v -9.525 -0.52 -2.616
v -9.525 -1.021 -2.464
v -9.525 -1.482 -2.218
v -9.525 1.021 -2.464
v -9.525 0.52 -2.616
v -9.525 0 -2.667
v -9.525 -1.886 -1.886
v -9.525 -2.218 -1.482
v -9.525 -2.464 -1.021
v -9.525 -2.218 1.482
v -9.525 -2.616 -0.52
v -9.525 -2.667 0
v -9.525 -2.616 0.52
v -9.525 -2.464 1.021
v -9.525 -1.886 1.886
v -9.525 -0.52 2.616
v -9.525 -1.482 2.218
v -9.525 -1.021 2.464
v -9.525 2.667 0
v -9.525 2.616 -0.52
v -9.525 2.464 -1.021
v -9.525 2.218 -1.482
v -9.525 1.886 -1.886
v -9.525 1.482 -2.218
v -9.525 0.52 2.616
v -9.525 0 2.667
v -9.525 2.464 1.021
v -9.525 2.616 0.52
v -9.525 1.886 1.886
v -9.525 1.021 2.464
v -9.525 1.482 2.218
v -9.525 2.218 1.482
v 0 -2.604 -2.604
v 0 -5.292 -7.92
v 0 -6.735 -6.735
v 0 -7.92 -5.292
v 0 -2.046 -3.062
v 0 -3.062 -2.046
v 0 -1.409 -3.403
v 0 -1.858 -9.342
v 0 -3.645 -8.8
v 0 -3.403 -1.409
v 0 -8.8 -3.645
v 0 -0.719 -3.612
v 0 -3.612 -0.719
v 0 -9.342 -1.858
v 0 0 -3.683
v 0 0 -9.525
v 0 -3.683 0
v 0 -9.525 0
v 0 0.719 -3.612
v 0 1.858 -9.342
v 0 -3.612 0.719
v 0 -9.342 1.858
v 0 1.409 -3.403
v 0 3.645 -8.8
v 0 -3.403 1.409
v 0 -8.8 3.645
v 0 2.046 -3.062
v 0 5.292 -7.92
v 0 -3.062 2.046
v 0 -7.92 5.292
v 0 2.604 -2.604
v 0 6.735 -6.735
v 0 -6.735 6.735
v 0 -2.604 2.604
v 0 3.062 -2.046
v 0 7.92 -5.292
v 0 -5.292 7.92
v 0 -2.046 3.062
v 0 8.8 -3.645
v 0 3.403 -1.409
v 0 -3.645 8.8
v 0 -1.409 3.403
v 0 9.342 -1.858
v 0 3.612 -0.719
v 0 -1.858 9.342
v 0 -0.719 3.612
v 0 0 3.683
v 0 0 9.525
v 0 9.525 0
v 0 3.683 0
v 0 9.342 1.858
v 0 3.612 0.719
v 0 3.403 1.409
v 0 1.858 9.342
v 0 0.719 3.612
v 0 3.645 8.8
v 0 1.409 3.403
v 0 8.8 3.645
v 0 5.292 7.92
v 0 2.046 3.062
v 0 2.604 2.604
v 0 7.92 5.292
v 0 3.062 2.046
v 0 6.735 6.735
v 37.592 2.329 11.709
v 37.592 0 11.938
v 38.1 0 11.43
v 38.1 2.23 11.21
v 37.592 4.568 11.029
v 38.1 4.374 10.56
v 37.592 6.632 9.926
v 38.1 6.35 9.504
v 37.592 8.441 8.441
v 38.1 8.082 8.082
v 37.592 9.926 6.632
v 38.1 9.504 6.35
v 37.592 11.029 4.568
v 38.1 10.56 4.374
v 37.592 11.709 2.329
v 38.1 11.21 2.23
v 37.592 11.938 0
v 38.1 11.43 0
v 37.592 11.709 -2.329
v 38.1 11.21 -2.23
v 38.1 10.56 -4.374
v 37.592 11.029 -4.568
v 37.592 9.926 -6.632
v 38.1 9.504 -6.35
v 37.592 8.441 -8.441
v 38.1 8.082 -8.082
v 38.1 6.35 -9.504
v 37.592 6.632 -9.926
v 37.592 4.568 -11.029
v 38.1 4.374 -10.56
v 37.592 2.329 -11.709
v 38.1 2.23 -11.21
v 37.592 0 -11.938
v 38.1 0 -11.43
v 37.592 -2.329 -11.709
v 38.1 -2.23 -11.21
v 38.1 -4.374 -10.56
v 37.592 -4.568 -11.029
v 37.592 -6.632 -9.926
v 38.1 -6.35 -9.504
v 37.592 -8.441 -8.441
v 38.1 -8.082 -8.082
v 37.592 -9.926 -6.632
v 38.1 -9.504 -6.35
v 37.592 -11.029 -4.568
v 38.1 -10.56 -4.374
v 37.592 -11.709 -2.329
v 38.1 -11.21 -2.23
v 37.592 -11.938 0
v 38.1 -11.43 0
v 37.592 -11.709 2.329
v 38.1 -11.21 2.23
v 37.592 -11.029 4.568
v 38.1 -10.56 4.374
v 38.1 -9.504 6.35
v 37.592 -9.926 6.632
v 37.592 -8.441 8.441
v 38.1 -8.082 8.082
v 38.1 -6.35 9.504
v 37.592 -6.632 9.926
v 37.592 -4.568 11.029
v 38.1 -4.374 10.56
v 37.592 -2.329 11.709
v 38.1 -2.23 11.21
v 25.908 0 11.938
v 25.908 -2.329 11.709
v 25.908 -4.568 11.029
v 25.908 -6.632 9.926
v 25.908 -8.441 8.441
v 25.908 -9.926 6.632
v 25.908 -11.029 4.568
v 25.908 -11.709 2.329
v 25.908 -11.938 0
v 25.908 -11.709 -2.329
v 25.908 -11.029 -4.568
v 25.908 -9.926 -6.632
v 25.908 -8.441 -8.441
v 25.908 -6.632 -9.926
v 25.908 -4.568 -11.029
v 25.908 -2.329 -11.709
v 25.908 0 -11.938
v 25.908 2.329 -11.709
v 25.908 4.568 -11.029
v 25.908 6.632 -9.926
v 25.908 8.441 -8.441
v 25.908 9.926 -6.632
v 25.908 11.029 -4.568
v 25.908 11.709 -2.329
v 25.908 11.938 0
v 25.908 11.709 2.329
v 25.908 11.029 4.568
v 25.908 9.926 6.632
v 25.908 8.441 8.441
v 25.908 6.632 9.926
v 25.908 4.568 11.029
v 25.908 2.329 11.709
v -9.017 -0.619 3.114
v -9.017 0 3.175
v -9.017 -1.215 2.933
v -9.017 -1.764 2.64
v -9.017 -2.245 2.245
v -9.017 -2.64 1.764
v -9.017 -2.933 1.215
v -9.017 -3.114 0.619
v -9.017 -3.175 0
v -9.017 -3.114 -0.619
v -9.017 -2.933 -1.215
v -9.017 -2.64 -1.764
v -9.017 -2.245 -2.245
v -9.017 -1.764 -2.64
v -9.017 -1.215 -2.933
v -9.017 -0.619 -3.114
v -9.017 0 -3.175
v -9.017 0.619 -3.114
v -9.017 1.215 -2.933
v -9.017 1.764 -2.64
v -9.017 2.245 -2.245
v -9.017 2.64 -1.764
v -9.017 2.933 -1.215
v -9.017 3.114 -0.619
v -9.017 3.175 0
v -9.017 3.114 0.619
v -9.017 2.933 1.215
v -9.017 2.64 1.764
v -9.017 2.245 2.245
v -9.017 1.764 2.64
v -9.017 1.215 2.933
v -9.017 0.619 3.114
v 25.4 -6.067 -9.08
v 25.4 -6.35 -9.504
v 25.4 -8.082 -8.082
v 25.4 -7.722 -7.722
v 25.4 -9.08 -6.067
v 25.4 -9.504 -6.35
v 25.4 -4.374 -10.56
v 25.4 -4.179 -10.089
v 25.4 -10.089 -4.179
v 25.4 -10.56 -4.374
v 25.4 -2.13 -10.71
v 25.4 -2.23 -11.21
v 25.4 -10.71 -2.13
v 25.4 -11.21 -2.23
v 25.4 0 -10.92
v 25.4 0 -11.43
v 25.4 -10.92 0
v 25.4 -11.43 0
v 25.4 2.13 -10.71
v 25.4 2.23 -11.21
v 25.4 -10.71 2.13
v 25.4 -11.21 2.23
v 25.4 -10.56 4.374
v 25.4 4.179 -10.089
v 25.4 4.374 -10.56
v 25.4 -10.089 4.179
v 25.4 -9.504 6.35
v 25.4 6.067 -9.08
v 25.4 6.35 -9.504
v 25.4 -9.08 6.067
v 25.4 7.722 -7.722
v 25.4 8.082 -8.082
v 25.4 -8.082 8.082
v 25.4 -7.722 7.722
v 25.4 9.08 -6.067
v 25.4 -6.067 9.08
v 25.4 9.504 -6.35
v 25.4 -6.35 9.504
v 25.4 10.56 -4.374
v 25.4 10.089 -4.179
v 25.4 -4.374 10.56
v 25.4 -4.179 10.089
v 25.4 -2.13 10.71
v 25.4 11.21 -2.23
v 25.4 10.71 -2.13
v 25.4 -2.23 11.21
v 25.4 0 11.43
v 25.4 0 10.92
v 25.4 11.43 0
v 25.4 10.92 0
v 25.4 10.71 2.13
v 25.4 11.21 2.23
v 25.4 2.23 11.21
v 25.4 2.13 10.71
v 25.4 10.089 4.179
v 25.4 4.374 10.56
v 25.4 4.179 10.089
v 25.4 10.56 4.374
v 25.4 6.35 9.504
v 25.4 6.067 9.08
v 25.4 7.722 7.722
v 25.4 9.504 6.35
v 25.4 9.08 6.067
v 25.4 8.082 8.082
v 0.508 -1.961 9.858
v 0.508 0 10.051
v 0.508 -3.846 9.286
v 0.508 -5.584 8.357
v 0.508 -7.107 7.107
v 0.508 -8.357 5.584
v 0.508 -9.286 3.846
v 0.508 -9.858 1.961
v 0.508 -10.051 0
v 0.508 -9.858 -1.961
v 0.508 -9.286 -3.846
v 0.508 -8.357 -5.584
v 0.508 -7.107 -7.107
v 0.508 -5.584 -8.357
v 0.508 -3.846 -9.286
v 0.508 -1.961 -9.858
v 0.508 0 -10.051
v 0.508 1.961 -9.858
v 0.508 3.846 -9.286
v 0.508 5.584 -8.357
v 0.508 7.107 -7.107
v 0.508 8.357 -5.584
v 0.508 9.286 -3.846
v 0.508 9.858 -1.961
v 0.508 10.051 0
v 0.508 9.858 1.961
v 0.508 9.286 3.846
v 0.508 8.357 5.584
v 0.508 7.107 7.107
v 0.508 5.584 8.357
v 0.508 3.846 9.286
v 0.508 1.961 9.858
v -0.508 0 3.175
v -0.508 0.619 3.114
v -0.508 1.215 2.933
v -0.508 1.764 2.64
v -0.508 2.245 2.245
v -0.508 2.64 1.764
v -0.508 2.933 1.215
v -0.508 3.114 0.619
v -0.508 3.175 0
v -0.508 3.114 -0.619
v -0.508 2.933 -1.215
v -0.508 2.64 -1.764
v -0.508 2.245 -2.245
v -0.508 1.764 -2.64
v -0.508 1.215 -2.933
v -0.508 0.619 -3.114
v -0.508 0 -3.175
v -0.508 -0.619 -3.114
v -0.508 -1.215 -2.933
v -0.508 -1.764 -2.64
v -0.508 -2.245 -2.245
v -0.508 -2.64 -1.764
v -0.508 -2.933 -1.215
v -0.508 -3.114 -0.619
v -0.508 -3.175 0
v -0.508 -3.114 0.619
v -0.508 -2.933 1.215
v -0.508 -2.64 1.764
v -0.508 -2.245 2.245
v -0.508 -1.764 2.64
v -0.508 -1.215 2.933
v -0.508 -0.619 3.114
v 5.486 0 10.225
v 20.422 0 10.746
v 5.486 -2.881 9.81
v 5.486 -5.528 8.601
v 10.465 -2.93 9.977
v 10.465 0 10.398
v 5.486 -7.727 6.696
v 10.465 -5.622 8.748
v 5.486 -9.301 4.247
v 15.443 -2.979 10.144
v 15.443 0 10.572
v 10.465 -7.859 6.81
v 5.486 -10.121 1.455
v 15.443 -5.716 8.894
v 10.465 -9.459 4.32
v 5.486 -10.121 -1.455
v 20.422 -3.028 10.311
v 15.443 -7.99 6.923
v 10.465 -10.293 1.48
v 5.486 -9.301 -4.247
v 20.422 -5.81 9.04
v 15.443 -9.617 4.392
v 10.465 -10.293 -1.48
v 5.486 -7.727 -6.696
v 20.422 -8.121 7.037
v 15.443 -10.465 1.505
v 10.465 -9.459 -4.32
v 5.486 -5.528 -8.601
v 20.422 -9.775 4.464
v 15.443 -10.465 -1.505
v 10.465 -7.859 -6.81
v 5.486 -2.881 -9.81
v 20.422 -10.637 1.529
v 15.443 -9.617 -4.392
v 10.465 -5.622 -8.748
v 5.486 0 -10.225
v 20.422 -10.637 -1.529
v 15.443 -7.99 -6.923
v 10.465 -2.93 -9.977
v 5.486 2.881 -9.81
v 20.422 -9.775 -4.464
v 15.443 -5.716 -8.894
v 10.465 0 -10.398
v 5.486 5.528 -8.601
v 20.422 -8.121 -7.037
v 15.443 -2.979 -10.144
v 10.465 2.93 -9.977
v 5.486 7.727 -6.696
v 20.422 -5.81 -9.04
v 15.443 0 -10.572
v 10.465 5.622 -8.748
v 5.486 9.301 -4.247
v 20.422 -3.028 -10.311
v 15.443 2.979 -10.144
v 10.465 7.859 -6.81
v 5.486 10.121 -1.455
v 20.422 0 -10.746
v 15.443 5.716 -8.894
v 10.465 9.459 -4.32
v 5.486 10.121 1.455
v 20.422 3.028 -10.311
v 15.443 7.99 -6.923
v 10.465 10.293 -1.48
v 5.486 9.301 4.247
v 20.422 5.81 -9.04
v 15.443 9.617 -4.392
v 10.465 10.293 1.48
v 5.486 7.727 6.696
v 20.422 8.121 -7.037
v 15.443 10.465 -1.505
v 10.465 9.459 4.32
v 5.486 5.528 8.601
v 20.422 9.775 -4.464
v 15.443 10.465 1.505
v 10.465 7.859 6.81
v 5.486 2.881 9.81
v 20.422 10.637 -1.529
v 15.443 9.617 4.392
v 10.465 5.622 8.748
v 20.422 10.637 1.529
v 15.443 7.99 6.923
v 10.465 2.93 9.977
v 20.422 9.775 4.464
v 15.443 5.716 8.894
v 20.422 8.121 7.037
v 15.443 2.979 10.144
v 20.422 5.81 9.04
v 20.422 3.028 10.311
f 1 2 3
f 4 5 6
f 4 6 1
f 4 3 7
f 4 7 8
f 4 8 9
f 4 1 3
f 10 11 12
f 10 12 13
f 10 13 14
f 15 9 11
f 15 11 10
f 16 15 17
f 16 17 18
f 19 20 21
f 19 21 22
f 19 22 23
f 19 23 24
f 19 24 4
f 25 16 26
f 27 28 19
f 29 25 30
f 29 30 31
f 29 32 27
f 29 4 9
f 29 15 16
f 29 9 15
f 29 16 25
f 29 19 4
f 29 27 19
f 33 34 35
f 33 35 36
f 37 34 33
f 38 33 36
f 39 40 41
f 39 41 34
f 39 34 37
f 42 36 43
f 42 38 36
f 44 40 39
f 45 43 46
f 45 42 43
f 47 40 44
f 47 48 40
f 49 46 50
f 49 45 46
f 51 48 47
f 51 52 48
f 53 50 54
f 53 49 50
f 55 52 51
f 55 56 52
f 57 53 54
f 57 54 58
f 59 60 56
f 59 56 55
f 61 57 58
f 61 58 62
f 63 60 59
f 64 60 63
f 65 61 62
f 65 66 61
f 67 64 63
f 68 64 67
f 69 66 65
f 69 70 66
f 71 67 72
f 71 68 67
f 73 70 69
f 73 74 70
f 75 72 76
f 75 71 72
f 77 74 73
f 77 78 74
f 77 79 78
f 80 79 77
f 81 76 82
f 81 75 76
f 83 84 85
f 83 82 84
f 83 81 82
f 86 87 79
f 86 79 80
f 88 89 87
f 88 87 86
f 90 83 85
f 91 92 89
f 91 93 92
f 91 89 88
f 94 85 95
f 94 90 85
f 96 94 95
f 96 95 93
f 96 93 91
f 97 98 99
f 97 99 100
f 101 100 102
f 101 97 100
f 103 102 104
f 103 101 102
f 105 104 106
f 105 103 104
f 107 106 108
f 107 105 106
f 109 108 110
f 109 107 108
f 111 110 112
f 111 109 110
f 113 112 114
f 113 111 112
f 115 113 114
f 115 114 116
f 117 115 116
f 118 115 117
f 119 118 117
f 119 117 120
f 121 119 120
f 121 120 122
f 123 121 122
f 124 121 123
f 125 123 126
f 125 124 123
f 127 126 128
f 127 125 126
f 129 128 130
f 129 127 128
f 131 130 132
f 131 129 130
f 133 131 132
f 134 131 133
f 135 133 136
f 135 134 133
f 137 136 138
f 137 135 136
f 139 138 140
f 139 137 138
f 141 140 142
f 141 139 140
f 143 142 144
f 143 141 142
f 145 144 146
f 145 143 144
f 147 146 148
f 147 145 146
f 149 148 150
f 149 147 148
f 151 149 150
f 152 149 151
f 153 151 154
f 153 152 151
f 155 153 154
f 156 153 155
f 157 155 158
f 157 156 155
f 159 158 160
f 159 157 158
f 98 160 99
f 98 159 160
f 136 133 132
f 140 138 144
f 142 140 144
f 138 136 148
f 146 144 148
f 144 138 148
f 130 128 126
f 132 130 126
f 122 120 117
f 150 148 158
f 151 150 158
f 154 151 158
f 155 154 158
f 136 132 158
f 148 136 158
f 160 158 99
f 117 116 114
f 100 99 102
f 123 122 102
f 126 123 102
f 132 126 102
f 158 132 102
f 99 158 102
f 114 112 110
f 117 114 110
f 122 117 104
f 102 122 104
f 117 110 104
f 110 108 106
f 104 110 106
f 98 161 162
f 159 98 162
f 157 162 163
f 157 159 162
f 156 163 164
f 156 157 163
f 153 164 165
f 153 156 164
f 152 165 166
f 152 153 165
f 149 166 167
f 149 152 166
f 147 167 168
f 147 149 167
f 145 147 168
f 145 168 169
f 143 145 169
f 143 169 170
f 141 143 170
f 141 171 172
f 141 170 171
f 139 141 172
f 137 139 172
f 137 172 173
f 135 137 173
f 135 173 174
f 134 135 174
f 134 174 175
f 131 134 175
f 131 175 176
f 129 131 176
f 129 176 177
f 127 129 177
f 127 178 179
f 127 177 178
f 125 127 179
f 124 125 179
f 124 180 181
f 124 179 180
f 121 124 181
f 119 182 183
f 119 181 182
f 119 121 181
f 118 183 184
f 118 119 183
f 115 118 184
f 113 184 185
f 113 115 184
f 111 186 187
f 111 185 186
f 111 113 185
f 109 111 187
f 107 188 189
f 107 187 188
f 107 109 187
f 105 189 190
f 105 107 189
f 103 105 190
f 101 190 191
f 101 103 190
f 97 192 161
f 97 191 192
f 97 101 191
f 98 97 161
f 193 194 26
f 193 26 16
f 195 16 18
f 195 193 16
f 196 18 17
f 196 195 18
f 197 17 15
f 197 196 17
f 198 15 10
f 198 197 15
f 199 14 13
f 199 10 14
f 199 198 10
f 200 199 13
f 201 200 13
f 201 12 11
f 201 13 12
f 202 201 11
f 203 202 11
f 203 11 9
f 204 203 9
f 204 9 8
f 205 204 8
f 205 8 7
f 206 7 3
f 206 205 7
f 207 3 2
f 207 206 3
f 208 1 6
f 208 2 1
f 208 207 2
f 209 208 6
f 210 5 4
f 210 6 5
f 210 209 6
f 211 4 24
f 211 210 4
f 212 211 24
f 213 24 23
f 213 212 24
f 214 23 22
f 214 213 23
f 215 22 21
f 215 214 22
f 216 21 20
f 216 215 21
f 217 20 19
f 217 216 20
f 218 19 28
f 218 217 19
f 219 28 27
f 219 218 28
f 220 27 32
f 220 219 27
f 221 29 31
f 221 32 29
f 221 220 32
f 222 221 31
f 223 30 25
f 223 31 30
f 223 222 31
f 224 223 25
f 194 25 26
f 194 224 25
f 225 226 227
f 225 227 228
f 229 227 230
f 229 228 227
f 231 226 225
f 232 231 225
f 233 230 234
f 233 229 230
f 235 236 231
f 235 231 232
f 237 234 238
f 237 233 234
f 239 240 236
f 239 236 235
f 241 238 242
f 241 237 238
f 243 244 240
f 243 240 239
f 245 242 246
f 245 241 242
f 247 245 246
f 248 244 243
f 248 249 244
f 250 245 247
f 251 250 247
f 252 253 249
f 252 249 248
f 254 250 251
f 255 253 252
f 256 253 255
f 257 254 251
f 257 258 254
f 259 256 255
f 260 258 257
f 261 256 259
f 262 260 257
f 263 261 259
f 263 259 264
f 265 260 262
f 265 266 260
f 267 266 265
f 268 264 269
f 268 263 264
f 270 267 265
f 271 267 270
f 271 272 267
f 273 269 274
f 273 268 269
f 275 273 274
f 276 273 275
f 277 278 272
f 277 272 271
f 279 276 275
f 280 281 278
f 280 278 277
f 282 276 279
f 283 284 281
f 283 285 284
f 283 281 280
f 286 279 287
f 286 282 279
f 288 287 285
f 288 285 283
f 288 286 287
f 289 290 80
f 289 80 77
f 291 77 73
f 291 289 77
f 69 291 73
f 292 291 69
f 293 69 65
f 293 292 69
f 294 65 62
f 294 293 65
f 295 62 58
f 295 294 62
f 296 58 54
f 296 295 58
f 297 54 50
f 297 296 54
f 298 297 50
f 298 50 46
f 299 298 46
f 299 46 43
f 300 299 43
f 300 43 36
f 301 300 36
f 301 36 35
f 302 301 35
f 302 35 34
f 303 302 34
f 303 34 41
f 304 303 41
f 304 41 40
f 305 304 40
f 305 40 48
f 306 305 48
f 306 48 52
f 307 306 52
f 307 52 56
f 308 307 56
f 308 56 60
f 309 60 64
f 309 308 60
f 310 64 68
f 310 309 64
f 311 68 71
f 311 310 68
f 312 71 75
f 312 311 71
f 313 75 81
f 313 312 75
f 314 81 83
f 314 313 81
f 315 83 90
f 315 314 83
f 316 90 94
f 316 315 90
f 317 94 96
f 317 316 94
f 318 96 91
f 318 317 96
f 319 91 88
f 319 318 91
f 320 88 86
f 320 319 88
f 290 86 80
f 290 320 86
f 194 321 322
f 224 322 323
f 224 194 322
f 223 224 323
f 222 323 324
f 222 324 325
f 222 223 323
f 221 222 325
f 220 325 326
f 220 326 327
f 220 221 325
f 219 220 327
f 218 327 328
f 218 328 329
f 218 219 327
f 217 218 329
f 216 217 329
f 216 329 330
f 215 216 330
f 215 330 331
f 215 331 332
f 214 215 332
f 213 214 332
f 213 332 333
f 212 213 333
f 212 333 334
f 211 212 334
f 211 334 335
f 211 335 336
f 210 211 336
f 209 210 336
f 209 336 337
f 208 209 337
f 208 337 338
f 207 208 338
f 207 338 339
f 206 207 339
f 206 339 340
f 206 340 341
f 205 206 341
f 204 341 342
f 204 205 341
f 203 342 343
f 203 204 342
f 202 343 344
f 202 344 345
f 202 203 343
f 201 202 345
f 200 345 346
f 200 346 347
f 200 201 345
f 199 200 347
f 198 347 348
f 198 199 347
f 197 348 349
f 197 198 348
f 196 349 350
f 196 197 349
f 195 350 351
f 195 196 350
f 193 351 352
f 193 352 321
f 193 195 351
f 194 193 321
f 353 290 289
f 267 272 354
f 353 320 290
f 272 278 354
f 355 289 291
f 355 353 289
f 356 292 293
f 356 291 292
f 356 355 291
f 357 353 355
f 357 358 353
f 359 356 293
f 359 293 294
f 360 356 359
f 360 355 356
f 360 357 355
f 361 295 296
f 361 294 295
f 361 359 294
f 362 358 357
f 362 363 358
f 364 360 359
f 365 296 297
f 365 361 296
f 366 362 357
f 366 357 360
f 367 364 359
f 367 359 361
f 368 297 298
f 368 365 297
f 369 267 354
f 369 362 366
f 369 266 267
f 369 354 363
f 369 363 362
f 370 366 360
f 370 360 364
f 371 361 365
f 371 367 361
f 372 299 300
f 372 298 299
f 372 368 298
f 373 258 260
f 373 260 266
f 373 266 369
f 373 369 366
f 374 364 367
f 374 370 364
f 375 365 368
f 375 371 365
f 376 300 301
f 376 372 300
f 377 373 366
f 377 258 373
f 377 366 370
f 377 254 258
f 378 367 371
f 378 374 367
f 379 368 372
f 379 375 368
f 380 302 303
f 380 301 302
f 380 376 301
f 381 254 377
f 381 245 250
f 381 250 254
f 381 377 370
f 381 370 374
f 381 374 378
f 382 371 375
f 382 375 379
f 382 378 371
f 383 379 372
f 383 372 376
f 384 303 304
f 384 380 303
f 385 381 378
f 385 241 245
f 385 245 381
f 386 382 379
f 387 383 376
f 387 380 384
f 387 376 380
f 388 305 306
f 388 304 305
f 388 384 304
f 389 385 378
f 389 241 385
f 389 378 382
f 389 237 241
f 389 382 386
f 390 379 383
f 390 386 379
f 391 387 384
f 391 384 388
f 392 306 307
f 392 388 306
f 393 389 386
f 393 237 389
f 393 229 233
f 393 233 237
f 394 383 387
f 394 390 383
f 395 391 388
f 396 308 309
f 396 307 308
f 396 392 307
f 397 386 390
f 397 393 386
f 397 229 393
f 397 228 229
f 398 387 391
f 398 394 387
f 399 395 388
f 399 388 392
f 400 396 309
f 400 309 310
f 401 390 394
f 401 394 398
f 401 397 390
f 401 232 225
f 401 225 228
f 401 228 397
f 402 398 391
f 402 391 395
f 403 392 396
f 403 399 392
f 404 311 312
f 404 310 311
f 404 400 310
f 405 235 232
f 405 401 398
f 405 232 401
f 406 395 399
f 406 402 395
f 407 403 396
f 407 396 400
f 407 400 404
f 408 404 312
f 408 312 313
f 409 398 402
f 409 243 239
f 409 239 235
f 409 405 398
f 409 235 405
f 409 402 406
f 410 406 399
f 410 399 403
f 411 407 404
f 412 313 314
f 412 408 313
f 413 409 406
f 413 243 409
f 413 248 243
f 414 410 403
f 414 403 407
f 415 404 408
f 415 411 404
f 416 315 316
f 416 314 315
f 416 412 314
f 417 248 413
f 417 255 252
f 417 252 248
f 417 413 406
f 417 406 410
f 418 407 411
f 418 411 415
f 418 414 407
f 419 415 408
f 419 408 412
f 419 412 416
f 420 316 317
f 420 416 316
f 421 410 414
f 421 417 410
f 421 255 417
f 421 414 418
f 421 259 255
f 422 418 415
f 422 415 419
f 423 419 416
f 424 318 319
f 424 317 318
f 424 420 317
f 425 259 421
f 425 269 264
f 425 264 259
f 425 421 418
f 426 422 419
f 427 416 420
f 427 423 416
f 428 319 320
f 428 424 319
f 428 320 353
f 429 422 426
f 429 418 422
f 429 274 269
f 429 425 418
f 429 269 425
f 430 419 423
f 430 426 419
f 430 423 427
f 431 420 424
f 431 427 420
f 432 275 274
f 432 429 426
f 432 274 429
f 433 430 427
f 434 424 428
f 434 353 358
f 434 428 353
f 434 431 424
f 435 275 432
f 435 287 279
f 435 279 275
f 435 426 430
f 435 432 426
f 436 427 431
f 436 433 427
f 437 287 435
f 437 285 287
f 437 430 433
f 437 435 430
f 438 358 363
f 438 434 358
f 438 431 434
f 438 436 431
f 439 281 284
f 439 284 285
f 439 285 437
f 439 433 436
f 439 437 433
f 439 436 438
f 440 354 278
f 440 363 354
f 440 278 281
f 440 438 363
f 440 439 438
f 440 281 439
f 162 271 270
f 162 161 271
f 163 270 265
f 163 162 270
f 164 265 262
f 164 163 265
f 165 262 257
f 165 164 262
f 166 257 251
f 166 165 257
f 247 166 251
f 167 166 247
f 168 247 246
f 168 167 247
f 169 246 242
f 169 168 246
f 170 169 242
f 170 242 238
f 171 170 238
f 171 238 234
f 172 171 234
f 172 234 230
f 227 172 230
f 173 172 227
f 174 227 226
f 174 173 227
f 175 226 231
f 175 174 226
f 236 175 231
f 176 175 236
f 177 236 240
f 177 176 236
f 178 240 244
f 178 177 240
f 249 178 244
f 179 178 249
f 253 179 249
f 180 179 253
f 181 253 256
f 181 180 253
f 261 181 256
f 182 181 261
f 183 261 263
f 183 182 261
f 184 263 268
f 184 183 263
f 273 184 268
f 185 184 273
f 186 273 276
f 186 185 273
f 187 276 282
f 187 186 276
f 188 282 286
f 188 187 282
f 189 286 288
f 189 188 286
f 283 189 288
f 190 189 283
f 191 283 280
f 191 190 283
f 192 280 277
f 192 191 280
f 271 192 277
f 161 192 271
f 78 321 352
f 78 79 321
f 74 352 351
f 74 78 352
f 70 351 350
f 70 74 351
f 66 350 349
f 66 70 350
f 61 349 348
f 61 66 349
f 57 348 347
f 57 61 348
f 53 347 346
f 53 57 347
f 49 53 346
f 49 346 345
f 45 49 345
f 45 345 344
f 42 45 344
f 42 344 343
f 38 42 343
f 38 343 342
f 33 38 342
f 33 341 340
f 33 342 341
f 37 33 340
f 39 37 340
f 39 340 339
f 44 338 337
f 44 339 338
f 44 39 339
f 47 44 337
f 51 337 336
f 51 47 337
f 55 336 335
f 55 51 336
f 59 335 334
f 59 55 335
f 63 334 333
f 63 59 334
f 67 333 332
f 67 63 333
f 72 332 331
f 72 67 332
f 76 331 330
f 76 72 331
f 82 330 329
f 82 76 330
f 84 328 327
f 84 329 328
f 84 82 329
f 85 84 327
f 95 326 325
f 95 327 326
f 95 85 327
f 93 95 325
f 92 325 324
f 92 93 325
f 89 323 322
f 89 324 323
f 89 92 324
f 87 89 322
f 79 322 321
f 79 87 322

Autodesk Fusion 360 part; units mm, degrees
sketch "Sketch1" plane through (0, 0, 0) normal (0, 1, 0) x (1, 0, 0)
  line L0 (0, 0) -> (0, -10.033)
  line L1 (25.4, -10.92) -> (25.4, -11.938)
  line L2 (25.4, -11.938) -> (38.1, -11.938)
  line L3 (38.1, -11.938) -> (38.1, 0)
  line L4 (38.1, 0) -> (0, 0)
  line L5 (25.4, -10.92) -> (0, -10.033)
  line L6 (0, -3.175) -> (-9.525, -3.175)
  line L7 (-9.525, -3.175) -> (-9.525, 0)
  line L8 (-9.525, 0) -> (0, 0)
  dimension "d1" = 10.033
  dimension "d2" = 25.4
  dimension "d3" = 12.7
  dimension "d4" = 11.938
  dimension "d5" = 92
  dimension "d7" = 3.175
  dimension "d8" = 9.525
revolve "Revolve1" add sketch "Sketch1" angle 360 about axis through (38.1, 0, 0) along (-1, 0, 0)
chamfer "Chamfer1" distance 0.508 angle 45 5 edges at (-9.525, -1.1481, -2.9601) (0, -1.1481, -2.9601) (0, -3.6281, -9.354) (25.4, -4.317, -11.1301) (38.1, -4.317, -11.1301)
